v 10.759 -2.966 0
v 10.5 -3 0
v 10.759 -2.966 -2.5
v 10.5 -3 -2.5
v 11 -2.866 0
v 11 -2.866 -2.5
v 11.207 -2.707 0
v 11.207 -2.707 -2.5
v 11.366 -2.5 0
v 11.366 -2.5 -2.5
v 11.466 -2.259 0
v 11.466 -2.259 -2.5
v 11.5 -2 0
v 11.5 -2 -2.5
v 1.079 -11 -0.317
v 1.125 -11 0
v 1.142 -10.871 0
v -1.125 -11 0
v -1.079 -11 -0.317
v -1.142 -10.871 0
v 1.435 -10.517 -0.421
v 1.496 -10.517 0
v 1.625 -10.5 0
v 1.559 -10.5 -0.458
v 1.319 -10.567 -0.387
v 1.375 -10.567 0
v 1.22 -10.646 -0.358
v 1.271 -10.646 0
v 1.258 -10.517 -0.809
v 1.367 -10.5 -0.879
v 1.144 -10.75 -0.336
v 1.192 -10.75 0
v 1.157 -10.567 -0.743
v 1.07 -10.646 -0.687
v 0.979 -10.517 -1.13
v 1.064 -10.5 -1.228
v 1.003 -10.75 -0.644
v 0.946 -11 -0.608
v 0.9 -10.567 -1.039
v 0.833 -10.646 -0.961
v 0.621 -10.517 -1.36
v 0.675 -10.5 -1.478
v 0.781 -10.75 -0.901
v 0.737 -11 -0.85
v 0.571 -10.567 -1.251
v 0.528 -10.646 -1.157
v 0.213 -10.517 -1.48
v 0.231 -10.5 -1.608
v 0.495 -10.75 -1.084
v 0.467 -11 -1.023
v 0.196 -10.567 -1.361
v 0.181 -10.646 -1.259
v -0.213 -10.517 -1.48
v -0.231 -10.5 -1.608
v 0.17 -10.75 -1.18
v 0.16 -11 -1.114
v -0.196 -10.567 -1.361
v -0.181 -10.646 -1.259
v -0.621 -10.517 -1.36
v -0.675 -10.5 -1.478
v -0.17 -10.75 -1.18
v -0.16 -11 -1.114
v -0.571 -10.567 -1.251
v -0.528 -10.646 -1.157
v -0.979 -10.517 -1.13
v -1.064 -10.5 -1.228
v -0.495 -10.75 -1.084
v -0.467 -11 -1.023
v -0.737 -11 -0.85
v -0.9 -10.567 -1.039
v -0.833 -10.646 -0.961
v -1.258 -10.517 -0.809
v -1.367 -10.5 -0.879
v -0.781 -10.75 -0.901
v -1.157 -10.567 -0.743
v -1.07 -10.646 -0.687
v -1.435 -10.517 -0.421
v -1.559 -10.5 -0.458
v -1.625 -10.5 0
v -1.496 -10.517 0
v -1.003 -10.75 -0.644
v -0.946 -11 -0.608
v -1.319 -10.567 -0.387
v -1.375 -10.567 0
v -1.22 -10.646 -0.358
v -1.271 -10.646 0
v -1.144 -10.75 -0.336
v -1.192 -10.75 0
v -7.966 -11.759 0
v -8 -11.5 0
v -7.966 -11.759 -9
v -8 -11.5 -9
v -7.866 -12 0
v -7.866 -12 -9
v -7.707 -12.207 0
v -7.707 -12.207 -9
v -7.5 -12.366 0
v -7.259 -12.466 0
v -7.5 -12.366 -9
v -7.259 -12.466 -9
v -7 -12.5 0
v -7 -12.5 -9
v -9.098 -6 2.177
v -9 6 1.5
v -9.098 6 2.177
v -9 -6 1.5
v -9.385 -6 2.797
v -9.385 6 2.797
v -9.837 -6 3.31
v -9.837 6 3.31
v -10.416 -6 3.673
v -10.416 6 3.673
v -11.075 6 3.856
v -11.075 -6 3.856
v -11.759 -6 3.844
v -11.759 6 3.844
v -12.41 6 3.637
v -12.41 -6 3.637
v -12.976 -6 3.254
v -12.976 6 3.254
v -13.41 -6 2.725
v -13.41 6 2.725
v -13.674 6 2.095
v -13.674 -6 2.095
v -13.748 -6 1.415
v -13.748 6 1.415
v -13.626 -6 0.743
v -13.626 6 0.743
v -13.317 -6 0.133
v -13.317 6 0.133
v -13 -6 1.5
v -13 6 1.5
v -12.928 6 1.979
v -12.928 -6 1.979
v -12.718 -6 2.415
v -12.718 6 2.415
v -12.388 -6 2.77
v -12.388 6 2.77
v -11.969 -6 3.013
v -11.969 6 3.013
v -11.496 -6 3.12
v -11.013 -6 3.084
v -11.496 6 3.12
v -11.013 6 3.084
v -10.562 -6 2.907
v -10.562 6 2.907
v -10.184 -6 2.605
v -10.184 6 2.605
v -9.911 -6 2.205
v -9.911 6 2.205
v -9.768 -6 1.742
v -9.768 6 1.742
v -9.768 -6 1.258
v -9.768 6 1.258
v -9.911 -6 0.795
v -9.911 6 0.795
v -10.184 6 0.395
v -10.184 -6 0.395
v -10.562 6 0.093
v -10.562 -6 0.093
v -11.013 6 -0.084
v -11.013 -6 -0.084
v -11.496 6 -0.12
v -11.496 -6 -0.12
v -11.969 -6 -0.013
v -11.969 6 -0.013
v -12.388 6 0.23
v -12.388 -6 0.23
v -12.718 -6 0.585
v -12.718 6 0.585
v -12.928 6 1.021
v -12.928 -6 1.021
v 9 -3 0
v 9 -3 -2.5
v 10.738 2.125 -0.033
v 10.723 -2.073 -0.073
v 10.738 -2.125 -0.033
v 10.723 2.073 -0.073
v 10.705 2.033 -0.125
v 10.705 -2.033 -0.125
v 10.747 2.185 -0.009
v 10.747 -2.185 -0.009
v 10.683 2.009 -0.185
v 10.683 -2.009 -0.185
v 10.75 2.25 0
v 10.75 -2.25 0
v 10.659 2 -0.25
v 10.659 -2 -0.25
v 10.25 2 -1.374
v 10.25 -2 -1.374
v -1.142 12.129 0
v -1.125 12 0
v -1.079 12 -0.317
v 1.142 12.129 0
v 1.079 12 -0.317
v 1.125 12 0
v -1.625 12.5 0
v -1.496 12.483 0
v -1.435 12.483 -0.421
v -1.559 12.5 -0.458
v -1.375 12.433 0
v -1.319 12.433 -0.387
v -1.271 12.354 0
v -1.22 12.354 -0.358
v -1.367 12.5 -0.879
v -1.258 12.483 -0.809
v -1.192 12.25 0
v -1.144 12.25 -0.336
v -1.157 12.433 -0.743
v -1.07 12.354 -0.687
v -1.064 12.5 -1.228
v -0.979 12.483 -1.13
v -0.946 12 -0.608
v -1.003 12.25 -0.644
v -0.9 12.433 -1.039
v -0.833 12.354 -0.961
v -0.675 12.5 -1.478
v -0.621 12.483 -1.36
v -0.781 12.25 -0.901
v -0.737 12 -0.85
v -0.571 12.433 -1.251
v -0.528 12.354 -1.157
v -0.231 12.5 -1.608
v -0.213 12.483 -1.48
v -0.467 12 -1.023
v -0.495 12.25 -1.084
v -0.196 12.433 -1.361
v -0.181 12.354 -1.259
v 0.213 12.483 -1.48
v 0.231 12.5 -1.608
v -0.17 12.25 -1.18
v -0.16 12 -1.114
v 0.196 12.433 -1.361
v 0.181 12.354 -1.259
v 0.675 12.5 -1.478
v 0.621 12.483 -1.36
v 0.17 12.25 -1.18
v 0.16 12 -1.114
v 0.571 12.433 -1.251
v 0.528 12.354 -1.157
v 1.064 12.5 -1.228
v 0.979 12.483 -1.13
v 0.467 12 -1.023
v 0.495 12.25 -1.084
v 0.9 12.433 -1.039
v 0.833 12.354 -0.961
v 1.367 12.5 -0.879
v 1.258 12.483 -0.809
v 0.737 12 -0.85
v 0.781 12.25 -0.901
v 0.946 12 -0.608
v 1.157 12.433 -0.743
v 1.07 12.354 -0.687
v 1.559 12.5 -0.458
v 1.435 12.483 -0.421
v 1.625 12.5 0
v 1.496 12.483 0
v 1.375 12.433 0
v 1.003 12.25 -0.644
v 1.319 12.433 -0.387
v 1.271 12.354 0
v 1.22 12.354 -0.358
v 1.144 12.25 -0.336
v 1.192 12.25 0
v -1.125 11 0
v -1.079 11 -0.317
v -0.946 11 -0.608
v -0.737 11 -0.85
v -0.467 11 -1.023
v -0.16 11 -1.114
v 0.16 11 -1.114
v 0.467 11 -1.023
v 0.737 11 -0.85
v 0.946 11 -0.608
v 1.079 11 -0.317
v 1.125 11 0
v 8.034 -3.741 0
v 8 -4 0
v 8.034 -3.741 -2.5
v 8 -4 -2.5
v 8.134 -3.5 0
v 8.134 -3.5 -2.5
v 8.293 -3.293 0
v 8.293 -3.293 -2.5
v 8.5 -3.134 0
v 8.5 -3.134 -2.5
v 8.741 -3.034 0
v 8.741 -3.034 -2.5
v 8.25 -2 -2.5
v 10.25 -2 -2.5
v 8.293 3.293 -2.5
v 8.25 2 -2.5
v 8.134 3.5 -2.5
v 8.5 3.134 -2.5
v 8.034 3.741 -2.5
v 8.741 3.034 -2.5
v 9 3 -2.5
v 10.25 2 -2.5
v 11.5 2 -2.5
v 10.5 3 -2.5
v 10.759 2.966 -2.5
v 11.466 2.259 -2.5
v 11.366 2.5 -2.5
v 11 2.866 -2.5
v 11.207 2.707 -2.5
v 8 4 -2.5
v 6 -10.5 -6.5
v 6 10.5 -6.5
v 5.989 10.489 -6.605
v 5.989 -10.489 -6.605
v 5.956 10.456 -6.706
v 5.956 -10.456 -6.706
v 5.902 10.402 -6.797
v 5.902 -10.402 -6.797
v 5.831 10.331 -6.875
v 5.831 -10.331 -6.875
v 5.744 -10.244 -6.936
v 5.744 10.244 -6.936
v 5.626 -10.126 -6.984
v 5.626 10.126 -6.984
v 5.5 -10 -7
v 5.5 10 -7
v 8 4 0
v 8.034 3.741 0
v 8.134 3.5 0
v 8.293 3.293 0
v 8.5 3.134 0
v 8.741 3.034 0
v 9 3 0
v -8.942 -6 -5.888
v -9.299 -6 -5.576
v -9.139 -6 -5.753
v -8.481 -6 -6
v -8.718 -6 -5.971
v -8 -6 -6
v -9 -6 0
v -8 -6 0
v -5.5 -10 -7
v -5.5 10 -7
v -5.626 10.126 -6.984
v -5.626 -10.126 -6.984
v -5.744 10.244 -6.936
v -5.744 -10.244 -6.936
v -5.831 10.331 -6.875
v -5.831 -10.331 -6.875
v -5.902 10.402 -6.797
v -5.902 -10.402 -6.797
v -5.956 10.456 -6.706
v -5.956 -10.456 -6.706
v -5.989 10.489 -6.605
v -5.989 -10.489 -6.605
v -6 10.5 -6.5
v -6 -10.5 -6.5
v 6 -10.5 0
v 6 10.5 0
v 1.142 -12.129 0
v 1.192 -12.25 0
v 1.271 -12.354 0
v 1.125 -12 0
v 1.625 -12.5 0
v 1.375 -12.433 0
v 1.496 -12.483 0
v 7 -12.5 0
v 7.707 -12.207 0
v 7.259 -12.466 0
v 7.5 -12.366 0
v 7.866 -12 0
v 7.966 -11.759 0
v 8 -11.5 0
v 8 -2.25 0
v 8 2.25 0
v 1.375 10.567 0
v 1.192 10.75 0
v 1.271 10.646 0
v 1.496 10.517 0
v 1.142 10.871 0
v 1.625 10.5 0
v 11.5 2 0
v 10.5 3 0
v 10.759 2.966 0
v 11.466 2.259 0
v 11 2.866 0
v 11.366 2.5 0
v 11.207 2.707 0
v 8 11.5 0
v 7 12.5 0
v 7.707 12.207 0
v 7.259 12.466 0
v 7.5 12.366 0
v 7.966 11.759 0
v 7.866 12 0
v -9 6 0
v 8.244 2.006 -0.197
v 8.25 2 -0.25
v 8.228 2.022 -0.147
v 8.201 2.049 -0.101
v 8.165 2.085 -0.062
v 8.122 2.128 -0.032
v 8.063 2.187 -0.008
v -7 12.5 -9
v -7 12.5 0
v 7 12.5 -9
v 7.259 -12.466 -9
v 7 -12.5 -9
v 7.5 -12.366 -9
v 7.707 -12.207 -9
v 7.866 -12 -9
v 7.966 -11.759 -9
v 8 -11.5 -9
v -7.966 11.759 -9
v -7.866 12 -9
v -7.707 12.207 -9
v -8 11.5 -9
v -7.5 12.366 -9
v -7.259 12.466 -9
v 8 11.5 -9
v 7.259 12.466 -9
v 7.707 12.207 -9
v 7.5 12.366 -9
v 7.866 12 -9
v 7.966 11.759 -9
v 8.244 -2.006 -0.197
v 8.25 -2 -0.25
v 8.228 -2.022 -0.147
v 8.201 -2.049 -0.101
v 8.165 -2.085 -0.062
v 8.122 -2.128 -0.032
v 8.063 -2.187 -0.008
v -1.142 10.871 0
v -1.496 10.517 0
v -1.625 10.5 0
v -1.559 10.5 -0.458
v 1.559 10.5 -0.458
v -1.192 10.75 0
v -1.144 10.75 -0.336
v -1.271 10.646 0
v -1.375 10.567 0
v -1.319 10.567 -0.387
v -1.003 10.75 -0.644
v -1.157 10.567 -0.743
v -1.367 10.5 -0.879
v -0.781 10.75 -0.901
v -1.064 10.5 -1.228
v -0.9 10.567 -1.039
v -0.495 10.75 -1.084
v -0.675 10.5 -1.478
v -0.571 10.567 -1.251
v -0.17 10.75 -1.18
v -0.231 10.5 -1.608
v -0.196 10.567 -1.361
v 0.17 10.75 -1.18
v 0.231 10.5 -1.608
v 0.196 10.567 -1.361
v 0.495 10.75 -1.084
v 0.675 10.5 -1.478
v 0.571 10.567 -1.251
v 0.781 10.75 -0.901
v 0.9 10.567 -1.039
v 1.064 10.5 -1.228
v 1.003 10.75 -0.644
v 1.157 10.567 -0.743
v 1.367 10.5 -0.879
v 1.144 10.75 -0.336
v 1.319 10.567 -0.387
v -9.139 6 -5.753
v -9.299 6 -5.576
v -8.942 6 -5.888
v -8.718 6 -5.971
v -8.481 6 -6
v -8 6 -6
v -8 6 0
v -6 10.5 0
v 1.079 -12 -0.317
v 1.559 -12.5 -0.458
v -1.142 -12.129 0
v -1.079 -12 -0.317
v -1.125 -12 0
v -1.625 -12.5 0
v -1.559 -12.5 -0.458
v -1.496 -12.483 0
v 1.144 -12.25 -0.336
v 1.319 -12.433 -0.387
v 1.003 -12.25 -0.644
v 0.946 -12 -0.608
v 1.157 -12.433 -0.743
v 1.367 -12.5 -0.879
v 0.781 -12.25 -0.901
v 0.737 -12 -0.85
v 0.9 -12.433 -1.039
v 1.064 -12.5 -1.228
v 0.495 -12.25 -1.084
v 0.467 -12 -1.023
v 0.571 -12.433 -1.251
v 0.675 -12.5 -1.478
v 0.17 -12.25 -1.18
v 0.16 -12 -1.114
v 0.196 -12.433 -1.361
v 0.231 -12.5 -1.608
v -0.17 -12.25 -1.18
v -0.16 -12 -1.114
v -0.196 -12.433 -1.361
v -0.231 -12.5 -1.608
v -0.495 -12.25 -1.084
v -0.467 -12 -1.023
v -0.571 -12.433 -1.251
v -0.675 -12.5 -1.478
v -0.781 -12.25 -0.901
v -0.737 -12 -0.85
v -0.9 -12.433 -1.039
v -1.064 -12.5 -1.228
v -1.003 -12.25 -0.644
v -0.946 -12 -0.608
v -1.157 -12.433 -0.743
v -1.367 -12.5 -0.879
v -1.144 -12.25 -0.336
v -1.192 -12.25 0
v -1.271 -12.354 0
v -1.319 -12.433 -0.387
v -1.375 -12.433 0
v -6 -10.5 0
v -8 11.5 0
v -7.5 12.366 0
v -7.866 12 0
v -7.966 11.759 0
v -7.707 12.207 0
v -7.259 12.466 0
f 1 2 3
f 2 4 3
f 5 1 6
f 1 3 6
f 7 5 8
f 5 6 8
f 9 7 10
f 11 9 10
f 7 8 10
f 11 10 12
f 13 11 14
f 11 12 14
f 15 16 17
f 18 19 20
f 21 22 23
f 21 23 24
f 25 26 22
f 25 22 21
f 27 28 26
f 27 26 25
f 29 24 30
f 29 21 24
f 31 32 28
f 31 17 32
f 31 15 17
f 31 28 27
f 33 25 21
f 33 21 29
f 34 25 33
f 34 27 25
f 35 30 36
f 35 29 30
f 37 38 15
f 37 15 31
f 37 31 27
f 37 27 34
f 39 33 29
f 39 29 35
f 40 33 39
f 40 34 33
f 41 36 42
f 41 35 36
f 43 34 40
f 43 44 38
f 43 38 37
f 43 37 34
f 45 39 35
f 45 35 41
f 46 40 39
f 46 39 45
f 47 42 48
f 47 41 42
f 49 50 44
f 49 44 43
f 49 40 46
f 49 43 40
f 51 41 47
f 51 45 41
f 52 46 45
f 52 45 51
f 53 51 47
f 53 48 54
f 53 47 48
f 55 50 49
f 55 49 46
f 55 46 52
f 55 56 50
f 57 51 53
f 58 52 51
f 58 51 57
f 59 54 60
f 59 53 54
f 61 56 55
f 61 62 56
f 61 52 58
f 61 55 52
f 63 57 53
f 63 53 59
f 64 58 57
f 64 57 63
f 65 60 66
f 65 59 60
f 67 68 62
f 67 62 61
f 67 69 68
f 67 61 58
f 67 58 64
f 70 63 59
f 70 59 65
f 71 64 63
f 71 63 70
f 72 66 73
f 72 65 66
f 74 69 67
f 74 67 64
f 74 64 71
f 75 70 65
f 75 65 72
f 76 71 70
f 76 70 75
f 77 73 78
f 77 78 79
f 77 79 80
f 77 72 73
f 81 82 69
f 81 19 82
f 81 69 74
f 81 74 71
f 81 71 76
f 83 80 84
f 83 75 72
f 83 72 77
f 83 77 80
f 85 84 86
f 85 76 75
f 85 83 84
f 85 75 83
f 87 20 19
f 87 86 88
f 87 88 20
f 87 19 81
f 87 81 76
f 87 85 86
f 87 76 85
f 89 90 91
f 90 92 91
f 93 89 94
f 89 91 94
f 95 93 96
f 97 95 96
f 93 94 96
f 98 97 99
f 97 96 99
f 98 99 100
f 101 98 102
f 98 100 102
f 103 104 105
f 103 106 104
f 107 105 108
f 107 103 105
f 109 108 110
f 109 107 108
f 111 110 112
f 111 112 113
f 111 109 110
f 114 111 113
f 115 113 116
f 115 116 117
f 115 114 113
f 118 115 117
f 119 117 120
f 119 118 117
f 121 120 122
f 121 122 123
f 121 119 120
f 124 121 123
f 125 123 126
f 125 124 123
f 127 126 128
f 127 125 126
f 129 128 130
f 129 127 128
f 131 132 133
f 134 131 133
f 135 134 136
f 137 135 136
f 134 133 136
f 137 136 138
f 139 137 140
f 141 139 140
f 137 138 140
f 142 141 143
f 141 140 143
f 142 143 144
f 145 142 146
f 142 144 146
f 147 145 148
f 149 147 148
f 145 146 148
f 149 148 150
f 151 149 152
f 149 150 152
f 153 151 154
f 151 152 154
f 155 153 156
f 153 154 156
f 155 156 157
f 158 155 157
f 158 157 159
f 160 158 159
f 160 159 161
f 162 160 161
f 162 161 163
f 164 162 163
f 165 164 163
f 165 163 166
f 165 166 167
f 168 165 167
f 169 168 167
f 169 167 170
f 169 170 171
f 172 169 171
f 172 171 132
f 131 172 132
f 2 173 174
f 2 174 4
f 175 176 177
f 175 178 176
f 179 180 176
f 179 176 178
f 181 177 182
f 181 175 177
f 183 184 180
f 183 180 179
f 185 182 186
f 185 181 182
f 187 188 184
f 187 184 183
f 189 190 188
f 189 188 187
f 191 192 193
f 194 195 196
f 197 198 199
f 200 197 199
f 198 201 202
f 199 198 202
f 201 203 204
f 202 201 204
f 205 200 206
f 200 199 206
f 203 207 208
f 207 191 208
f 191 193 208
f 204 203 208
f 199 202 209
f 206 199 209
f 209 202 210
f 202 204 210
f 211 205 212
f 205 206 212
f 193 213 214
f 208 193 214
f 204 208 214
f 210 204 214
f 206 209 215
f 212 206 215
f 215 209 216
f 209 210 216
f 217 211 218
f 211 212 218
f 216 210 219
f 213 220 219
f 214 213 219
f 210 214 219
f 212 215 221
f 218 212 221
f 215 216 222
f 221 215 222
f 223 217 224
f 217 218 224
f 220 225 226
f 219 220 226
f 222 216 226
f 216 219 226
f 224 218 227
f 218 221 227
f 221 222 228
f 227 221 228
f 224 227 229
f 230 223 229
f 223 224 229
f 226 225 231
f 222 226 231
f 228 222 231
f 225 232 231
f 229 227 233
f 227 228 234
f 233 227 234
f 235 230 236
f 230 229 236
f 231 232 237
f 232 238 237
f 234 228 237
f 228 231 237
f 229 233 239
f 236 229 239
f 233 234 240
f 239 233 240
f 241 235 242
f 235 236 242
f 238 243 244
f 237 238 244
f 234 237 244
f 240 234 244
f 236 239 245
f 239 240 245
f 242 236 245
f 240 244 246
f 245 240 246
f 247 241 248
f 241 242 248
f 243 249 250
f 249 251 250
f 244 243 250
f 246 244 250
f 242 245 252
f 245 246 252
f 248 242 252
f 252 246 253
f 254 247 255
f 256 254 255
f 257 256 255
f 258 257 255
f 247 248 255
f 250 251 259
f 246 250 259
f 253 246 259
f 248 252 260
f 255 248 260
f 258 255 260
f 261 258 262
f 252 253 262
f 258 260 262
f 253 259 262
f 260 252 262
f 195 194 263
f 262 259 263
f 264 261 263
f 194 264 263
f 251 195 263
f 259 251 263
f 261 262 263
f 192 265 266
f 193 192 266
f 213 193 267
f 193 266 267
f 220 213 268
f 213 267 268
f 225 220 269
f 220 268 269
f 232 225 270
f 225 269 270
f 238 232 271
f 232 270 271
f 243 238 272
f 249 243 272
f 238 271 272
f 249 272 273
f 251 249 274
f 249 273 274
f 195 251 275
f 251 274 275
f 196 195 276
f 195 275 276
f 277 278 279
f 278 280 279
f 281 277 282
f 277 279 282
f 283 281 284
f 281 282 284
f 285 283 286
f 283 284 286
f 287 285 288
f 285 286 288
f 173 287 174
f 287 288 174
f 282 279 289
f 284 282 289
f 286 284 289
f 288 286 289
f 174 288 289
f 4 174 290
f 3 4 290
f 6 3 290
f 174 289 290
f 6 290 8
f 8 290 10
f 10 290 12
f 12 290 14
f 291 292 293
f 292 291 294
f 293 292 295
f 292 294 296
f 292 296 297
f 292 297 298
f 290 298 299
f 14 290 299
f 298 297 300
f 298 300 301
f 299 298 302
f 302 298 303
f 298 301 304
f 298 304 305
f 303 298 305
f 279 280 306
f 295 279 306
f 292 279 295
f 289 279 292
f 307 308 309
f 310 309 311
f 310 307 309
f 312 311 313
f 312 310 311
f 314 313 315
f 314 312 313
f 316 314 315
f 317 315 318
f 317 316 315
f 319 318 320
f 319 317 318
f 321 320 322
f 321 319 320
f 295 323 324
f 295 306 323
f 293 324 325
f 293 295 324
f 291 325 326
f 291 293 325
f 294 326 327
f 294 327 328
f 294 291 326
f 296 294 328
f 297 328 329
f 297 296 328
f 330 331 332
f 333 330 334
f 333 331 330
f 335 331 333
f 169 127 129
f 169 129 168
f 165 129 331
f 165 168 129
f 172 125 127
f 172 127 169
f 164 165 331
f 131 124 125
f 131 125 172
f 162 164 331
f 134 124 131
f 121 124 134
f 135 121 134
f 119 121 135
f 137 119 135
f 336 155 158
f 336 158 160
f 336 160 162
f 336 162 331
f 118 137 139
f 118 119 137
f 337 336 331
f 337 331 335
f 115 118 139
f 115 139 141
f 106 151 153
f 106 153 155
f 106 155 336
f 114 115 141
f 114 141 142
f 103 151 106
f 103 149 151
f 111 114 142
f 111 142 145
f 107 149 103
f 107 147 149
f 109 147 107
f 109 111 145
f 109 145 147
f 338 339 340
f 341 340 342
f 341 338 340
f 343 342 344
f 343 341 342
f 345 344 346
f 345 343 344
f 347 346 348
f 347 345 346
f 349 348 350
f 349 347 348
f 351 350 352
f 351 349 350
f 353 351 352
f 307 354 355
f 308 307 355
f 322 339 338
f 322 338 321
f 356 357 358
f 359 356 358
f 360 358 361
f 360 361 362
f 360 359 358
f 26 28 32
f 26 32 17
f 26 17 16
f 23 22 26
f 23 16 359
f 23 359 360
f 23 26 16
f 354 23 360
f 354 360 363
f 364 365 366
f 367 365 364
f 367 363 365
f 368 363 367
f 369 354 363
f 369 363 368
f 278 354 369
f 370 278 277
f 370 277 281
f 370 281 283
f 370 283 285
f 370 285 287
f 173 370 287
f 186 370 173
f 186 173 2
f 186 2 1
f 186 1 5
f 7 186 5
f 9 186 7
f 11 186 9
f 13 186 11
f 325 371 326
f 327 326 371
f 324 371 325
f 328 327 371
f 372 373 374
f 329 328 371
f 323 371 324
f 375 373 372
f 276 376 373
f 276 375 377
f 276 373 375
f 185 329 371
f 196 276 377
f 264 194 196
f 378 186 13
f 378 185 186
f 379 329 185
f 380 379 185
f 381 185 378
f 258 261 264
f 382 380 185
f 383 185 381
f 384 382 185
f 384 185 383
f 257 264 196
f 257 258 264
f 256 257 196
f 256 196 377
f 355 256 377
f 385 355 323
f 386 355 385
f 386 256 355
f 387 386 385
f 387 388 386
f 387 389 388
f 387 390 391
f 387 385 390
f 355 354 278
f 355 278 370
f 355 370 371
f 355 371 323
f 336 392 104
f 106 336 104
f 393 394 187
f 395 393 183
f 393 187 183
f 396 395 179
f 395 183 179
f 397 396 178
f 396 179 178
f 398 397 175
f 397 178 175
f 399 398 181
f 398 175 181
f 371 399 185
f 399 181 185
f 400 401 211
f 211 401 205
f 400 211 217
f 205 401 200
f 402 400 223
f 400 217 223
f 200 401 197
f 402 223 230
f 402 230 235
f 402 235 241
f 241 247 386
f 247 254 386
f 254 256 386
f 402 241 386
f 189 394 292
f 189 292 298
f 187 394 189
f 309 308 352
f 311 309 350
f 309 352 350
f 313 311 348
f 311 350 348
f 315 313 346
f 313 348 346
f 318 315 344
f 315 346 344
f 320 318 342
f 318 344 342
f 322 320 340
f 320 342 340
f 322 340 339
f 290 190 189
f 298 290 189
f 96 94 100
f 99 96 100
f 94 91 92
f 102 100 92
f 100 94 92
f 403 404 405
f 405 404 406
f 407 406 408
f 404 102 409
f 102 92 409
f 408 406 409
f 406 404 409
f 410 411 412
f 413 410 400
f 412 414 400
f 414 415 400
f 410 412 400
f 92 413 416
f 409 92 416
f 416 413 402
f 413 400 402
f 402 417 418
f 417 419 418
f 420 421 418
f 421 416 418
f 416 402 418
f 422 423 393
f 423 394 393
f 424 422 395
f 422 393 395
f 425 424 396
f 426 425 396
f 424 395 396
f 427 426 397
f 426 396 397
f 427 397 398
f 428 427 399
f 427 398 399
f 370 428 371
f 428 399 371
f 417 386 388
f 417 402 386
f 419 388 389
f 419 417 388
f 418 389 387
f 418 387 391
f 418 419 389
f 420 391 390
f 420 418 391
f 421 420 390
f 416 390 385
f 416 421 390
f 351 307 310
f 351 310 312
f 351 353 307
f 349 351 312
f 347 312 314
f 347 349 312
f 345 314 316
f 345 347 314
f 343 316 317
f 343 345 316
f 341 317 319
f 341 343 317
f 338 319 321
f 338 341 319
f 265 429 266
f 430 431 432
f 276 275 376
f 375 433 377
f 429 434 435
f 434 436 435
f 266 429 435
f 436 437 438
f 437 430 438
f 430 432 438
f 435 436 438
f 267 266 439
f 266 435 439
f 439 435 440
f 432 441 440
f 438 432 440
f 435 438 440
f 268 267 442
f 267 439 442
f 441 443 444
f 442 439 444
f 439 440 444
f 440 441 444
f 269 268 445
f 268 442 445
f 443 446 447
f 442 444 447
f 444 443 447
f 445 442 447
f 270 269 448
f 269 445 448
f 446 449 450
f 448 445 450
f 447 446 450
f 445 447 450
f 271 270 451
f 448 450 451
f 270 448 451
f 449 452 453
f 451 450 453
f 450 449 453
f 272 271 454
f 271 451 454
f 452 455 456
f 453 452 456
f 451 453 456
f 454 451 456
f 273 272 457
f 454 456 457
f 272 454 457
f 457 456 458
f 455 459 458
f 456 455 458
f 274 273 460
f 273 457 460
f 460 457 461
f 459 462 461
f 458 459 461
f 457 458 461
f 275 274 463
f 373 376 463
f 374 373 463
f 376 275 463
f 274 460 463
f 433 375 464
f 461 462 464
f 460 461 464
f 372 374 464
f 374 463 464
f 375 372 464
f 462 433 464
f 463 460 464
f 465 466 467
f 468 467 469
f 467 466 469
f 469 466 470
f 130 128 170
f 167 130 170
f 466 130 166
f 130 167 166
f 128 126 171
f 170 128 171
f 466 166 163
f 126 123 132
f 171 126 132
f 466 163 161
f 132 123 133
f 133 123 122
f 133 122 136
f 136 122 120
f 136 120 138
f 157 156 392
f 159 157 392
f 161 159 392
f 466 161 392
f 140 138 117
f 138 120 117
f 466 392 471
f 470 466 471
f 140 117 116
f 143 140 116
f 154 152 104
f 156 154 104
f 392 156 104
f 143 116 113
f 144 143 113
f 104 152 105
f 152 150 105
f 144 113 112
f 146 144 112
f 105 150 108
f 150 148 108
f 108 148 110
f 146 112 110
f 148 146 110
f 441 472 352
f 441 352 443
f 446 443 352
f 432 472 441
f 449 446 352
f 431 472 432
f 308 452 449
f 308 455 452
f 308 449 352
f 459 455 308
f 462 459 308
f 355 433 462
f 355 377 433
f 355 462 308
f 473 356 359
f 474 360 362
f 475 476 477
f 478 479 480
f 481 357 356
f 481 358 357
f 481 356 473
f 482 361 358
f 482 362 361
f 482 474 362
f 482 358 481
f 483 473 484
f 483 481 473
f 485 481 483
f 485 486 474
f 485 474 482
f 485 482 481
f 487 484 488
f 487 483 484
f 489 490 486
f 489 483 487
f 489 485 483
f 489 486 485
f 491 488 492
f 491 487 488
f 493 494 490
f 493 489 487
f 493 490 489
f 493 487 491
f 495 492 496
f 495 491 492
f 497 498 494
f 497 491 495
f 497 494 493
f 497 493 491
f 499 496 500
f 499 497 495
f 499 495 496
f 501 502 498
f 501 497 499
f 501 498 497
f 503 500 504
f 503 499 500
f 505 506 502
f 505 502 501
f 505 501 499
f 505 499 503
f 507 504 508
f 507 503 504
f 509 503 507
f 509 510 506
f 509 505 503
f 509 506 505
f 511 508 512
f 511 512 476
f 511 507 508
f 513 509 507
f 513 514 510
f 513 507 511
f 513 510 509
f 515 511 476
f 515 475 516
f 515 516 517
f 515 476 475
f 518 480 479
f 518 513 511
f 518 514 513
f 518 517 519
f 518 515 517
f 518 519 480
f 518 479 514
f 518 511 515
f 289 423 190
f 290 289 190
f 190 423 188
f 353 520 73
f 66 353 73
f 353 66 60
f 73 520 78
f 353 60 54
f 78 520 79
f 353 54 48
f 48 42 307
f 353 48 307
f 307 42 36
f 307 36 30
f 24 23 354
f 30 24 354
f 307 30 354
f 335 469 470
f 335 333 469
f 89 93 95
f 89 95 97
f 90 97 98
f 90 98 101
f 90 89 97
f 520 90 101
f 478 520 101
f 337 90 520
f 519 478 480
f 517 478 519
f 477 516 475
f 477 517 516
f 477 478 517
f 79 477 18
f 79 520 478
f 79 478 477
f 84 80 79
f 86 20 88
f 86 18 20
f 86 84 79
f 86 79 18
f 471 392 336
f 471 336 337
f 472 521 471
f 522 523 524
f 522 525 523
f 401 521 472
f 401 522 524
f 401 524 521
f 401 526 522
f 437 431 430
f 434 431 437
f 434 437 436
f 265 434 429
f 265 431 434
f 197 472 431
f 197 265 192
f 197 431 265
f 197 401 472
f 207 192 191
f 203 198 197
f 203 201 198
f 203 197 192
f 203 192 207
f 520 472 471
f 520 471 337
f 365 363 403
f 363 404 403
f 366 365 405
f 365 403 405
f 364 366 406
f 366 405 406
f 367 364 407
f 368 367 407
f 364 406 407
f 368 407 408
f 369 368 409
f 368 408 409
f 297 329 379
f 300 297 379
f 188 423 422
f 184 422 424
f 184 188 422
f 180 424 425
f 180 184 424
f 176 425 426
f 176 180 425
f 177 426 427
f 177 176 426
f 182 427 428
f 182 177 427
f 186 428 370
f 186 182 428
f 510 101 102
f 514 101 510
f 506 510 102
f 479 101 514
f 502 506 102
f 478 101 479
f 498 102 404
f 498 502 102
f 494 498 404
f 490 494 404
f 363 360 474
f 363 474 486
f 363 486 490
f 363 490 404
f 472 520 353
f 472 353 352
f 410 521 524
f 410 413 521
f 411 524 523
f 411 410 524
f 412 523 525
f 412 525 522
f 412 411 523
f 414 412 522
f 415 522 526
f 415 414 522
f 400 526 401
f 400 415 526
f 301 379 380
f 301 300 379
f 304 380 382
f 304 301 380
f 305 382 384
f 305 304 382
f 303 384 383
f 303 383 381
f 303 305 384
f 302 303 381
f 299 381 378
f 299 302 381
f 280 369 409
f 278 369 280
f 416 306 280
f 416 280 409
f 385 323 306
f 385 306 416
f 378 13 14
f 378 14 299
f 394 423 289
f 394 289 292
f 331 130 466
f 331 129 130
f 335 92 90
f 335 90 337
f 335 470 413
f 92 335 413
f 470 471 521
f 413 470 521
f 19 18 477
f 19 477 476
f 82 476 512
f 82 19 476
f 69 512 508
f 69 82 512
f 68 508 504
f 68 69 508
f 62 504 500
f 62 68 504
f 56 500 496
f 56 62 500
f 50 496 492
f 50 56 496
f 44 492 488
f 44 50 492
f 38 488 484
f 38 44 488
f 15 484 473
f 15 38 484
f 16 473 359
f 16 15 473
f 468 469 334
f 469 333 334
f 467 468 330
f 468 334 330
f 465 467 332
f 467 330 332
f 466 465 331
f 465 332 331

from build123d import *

# Parameters (mm, degrees)
F0_W          = 16
F0_H          = 25
F1_DEPTH      = 9
F2_T          = -2
F4_DEPTH      = 6
F5_R          = 1.625
F6_DEPTH      = 25
F7_R          = 1.125
F8_DEPTH      = 25
F8_DEPTH_BACK = 25
F9_R          = 1
F11_W         = 3.5
F11_H         = 6
F11_W_2       = 2
F11_H_2       = 4
F12_DEPTH     = 2.5
F13_R         = 1
F14_R         = 0.25
F15_SIZE2     = 1.3737387097
F15_SIZE      = 0.5
F16_R         = 0.5
F17_R         = 0.5


# Not quite as in the source:
# - two fillets or chamfers of one size are made in one step


with BuildPart() as f1:
    # F0 (on Top) → F1 (new body)
    with BuildSketch(Plane.XY):
        Rectangle(F0_W, F0_H)
    extrude(amount=-F1_DEPTH)

    # F2
    f2_openings = [f1.faces().sort_by_distance(p)[0] for p in [
        (0, 0, 0),
    ]]
    offset(amount=F2_T, openings=f2_openings)

    # F3 (on Front) → F4 (join, symmetric)
    with BuildSketch(Plane.XZ):
        with BuildLine():
            ThreePointArc((-9, 1.5), (-12.0919927986, 3.7641877852), (-13.3170916435, 0.1329209796))
            Line((-13.3170916435, 0.1329209796), (-9, -6))
            Line((-9, -6), (-8, -6))
            Line((-8, -6), (-8, 0))
            Line((-8, 0), (-9, 0))
            Line((-9, 0), (-9, 1.5))
        make_face()
    extrude(amount=F4_DEPTH, both=True)

    # F5 (on face) → F6 (cut)
    with BuildSketch(Plane(origin=(0, 6, 0), x_dir=(-1, 0, 0), z_dir=(0, 1, 0))):
        with Locations((11.375, 1.5)):
            Circle(F5_R)
    extrude(amount=-F6_DEPTH, mode=Mode.SUBTRACT)

    # F7 (on Front) → F8 (cut, two sides)
    with BuildSketch(Plane.XZ) as f8_sk:
        Circle(F7_R)
    extrude(amount=-F8_DEPTH, mode=Mode.SUBTRACT)
    extrude(f8_sk.sketch, amount=F8_DEPTH_BACK, mode=Mode.SUBTRACT)

    # F9
    f9_edges = [f1.edges().sort_by_distance(p)[0] for p in [
        (8, -12.5, -4.5),
        (8, 12.5, -4.5),
        (-8, -12.5, -4.5),
        (-8, 12.5, -4.5),
        (-9, 0, -6),
    ]]
    fillet(f9_edges, radius=F9_R)

    # F11 (on face) → F12 (join)
    with BuildSketch(Plane.XY):
        with Locations((9.75, 0)):
            Rectangle(F11_W, F11_H)
        with Locations((9.25, 0)):
            Rectangle(F11_W_2, F11_H_2, mode=Mode.SUBTRACT)
    extrude(amount=-F12_DEPTH)

    # F13
    f13_edges = [f1.edges().sort_by_distance(p)[0] for p in [
        (11.5, -3, -1.25),
        (8, -3, -1.25),
        (11.5, 3, -1.25),
        (8, 3, -1.25),
    ]]
    fillet(f13_edges, radius=F13_R)

    # F14
    f14_edges = [f1.edges().sort_by_distance(p)[0] for p in [
        (9.25, 2, 0),
        (8.25, 0, 0),
        (9.25, -2, 0),
    ]]
    fillet(f14_edges, radius=F14_R)

    # F15
    f15_edges = [f1.edges().sort_by_distance(p)[0] for p in [
        (10.25, 0, 0),
    ]]
    f15_side = f1.faces().sort_by_distance((6.594217, 0, 0))[0]
    chamfer(f15_edges, length=F15_SIZE, length2=F15_SIZE2, reference=f15_side)

    # F16
    f16_edges = [f1.edges().sort_by_distance(p)[0] for p in [
        (0, 12.5, -1.125),
        (0, -12.5, -1.125),
    ]]
    fillet(f16_edges, radius=F16_R)

    # F17
    f17_edges = [f1.edges().sort_by_distance(p)[0] for p in [
        (0, 10.5, -1.125),
        (0, 10.5, -7),
        (0, -10.5, -7),
        (6, 0, -7),
        (0, -10.5, -1.125),
        (-6, 0, -7),
    ]]
    fillet(f17_edges, radius=F17_R)


solid = f1.part
